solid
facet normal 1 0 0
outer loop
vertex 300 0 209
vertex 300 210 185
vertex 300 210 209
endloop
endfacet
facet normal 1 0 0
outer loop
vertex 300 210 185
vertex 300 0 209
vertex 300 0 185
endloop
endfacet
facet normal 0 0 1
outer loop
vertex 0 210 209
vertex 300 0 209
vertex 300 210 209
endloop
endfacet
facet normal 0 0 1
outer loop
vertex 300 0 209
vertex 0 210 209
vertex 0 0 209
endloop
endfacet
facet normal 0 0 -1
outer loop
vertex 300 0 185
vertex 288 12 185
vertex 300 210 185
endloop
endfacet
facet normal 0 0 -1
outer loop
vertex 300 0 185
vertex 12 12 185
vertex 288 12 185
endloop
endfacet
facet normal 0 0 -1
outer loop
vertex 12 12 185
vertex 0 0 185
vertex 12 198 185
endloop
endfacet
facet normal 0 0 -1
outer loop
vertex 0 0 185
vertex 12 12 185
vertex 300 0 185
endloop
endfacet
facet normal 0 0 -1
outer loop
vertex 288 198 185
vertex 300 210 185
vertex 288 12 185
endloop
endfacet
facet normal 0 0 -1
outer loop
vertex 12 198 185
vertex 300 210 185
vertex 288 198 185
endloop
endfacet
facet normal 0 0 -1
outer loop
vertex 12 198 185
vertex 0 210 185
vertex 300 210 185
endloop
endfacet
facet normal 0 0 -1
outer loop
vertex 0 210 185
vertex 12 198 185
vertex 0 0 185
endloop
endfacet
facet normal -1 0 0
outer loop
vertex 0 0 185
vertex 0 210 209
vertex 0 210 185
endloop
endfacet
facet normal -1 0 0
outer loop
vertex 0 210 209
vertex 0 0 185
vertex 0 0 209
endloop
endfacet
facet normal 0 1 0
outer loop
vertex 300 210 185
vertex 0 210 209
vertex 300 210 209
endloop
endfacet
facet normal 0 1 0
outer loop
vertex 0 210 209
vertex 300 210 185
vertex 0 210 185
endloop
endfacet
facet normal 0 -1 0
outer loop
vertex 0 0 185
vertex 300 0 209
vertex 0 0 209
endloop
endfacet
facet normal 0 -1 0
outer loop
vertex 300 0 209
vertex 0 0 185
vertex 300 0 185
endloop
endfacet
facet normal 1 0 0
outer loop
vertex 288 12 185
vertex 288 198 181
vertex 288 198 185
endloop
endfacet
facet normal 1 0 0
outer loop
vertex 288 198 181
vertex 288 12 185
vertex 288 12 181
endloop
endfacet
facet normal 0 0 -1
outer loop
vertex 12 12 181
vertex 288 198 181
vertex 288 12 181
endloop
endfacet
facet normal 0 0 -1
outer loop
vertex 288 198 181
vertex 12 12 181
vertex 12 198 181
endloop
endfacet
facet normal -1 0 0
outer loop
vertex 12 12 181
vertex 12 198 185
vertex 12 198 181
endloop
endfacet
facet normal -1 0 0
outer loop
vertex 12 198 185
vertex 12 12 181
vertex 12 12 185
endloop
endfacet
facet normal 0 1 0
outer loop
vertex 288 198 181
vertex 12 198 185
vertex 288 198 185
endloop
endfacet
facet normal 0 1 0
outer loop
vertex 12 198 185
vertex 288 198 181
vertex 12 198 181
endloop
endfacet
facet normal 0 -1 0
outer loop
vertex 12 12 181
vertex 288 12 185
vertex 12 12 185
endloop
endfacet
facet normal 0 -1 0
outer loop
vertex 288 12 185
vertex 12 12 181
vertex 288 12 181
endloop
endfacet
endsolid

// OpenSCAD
W=300;D=210;H=185;lidH=24;color([.8,.8,.78])translate([0,0,H])cube([W,D,lidH]);color([.05,.3,.1])translate([12,12,H-4])cube([W-24,D-24,4]);
